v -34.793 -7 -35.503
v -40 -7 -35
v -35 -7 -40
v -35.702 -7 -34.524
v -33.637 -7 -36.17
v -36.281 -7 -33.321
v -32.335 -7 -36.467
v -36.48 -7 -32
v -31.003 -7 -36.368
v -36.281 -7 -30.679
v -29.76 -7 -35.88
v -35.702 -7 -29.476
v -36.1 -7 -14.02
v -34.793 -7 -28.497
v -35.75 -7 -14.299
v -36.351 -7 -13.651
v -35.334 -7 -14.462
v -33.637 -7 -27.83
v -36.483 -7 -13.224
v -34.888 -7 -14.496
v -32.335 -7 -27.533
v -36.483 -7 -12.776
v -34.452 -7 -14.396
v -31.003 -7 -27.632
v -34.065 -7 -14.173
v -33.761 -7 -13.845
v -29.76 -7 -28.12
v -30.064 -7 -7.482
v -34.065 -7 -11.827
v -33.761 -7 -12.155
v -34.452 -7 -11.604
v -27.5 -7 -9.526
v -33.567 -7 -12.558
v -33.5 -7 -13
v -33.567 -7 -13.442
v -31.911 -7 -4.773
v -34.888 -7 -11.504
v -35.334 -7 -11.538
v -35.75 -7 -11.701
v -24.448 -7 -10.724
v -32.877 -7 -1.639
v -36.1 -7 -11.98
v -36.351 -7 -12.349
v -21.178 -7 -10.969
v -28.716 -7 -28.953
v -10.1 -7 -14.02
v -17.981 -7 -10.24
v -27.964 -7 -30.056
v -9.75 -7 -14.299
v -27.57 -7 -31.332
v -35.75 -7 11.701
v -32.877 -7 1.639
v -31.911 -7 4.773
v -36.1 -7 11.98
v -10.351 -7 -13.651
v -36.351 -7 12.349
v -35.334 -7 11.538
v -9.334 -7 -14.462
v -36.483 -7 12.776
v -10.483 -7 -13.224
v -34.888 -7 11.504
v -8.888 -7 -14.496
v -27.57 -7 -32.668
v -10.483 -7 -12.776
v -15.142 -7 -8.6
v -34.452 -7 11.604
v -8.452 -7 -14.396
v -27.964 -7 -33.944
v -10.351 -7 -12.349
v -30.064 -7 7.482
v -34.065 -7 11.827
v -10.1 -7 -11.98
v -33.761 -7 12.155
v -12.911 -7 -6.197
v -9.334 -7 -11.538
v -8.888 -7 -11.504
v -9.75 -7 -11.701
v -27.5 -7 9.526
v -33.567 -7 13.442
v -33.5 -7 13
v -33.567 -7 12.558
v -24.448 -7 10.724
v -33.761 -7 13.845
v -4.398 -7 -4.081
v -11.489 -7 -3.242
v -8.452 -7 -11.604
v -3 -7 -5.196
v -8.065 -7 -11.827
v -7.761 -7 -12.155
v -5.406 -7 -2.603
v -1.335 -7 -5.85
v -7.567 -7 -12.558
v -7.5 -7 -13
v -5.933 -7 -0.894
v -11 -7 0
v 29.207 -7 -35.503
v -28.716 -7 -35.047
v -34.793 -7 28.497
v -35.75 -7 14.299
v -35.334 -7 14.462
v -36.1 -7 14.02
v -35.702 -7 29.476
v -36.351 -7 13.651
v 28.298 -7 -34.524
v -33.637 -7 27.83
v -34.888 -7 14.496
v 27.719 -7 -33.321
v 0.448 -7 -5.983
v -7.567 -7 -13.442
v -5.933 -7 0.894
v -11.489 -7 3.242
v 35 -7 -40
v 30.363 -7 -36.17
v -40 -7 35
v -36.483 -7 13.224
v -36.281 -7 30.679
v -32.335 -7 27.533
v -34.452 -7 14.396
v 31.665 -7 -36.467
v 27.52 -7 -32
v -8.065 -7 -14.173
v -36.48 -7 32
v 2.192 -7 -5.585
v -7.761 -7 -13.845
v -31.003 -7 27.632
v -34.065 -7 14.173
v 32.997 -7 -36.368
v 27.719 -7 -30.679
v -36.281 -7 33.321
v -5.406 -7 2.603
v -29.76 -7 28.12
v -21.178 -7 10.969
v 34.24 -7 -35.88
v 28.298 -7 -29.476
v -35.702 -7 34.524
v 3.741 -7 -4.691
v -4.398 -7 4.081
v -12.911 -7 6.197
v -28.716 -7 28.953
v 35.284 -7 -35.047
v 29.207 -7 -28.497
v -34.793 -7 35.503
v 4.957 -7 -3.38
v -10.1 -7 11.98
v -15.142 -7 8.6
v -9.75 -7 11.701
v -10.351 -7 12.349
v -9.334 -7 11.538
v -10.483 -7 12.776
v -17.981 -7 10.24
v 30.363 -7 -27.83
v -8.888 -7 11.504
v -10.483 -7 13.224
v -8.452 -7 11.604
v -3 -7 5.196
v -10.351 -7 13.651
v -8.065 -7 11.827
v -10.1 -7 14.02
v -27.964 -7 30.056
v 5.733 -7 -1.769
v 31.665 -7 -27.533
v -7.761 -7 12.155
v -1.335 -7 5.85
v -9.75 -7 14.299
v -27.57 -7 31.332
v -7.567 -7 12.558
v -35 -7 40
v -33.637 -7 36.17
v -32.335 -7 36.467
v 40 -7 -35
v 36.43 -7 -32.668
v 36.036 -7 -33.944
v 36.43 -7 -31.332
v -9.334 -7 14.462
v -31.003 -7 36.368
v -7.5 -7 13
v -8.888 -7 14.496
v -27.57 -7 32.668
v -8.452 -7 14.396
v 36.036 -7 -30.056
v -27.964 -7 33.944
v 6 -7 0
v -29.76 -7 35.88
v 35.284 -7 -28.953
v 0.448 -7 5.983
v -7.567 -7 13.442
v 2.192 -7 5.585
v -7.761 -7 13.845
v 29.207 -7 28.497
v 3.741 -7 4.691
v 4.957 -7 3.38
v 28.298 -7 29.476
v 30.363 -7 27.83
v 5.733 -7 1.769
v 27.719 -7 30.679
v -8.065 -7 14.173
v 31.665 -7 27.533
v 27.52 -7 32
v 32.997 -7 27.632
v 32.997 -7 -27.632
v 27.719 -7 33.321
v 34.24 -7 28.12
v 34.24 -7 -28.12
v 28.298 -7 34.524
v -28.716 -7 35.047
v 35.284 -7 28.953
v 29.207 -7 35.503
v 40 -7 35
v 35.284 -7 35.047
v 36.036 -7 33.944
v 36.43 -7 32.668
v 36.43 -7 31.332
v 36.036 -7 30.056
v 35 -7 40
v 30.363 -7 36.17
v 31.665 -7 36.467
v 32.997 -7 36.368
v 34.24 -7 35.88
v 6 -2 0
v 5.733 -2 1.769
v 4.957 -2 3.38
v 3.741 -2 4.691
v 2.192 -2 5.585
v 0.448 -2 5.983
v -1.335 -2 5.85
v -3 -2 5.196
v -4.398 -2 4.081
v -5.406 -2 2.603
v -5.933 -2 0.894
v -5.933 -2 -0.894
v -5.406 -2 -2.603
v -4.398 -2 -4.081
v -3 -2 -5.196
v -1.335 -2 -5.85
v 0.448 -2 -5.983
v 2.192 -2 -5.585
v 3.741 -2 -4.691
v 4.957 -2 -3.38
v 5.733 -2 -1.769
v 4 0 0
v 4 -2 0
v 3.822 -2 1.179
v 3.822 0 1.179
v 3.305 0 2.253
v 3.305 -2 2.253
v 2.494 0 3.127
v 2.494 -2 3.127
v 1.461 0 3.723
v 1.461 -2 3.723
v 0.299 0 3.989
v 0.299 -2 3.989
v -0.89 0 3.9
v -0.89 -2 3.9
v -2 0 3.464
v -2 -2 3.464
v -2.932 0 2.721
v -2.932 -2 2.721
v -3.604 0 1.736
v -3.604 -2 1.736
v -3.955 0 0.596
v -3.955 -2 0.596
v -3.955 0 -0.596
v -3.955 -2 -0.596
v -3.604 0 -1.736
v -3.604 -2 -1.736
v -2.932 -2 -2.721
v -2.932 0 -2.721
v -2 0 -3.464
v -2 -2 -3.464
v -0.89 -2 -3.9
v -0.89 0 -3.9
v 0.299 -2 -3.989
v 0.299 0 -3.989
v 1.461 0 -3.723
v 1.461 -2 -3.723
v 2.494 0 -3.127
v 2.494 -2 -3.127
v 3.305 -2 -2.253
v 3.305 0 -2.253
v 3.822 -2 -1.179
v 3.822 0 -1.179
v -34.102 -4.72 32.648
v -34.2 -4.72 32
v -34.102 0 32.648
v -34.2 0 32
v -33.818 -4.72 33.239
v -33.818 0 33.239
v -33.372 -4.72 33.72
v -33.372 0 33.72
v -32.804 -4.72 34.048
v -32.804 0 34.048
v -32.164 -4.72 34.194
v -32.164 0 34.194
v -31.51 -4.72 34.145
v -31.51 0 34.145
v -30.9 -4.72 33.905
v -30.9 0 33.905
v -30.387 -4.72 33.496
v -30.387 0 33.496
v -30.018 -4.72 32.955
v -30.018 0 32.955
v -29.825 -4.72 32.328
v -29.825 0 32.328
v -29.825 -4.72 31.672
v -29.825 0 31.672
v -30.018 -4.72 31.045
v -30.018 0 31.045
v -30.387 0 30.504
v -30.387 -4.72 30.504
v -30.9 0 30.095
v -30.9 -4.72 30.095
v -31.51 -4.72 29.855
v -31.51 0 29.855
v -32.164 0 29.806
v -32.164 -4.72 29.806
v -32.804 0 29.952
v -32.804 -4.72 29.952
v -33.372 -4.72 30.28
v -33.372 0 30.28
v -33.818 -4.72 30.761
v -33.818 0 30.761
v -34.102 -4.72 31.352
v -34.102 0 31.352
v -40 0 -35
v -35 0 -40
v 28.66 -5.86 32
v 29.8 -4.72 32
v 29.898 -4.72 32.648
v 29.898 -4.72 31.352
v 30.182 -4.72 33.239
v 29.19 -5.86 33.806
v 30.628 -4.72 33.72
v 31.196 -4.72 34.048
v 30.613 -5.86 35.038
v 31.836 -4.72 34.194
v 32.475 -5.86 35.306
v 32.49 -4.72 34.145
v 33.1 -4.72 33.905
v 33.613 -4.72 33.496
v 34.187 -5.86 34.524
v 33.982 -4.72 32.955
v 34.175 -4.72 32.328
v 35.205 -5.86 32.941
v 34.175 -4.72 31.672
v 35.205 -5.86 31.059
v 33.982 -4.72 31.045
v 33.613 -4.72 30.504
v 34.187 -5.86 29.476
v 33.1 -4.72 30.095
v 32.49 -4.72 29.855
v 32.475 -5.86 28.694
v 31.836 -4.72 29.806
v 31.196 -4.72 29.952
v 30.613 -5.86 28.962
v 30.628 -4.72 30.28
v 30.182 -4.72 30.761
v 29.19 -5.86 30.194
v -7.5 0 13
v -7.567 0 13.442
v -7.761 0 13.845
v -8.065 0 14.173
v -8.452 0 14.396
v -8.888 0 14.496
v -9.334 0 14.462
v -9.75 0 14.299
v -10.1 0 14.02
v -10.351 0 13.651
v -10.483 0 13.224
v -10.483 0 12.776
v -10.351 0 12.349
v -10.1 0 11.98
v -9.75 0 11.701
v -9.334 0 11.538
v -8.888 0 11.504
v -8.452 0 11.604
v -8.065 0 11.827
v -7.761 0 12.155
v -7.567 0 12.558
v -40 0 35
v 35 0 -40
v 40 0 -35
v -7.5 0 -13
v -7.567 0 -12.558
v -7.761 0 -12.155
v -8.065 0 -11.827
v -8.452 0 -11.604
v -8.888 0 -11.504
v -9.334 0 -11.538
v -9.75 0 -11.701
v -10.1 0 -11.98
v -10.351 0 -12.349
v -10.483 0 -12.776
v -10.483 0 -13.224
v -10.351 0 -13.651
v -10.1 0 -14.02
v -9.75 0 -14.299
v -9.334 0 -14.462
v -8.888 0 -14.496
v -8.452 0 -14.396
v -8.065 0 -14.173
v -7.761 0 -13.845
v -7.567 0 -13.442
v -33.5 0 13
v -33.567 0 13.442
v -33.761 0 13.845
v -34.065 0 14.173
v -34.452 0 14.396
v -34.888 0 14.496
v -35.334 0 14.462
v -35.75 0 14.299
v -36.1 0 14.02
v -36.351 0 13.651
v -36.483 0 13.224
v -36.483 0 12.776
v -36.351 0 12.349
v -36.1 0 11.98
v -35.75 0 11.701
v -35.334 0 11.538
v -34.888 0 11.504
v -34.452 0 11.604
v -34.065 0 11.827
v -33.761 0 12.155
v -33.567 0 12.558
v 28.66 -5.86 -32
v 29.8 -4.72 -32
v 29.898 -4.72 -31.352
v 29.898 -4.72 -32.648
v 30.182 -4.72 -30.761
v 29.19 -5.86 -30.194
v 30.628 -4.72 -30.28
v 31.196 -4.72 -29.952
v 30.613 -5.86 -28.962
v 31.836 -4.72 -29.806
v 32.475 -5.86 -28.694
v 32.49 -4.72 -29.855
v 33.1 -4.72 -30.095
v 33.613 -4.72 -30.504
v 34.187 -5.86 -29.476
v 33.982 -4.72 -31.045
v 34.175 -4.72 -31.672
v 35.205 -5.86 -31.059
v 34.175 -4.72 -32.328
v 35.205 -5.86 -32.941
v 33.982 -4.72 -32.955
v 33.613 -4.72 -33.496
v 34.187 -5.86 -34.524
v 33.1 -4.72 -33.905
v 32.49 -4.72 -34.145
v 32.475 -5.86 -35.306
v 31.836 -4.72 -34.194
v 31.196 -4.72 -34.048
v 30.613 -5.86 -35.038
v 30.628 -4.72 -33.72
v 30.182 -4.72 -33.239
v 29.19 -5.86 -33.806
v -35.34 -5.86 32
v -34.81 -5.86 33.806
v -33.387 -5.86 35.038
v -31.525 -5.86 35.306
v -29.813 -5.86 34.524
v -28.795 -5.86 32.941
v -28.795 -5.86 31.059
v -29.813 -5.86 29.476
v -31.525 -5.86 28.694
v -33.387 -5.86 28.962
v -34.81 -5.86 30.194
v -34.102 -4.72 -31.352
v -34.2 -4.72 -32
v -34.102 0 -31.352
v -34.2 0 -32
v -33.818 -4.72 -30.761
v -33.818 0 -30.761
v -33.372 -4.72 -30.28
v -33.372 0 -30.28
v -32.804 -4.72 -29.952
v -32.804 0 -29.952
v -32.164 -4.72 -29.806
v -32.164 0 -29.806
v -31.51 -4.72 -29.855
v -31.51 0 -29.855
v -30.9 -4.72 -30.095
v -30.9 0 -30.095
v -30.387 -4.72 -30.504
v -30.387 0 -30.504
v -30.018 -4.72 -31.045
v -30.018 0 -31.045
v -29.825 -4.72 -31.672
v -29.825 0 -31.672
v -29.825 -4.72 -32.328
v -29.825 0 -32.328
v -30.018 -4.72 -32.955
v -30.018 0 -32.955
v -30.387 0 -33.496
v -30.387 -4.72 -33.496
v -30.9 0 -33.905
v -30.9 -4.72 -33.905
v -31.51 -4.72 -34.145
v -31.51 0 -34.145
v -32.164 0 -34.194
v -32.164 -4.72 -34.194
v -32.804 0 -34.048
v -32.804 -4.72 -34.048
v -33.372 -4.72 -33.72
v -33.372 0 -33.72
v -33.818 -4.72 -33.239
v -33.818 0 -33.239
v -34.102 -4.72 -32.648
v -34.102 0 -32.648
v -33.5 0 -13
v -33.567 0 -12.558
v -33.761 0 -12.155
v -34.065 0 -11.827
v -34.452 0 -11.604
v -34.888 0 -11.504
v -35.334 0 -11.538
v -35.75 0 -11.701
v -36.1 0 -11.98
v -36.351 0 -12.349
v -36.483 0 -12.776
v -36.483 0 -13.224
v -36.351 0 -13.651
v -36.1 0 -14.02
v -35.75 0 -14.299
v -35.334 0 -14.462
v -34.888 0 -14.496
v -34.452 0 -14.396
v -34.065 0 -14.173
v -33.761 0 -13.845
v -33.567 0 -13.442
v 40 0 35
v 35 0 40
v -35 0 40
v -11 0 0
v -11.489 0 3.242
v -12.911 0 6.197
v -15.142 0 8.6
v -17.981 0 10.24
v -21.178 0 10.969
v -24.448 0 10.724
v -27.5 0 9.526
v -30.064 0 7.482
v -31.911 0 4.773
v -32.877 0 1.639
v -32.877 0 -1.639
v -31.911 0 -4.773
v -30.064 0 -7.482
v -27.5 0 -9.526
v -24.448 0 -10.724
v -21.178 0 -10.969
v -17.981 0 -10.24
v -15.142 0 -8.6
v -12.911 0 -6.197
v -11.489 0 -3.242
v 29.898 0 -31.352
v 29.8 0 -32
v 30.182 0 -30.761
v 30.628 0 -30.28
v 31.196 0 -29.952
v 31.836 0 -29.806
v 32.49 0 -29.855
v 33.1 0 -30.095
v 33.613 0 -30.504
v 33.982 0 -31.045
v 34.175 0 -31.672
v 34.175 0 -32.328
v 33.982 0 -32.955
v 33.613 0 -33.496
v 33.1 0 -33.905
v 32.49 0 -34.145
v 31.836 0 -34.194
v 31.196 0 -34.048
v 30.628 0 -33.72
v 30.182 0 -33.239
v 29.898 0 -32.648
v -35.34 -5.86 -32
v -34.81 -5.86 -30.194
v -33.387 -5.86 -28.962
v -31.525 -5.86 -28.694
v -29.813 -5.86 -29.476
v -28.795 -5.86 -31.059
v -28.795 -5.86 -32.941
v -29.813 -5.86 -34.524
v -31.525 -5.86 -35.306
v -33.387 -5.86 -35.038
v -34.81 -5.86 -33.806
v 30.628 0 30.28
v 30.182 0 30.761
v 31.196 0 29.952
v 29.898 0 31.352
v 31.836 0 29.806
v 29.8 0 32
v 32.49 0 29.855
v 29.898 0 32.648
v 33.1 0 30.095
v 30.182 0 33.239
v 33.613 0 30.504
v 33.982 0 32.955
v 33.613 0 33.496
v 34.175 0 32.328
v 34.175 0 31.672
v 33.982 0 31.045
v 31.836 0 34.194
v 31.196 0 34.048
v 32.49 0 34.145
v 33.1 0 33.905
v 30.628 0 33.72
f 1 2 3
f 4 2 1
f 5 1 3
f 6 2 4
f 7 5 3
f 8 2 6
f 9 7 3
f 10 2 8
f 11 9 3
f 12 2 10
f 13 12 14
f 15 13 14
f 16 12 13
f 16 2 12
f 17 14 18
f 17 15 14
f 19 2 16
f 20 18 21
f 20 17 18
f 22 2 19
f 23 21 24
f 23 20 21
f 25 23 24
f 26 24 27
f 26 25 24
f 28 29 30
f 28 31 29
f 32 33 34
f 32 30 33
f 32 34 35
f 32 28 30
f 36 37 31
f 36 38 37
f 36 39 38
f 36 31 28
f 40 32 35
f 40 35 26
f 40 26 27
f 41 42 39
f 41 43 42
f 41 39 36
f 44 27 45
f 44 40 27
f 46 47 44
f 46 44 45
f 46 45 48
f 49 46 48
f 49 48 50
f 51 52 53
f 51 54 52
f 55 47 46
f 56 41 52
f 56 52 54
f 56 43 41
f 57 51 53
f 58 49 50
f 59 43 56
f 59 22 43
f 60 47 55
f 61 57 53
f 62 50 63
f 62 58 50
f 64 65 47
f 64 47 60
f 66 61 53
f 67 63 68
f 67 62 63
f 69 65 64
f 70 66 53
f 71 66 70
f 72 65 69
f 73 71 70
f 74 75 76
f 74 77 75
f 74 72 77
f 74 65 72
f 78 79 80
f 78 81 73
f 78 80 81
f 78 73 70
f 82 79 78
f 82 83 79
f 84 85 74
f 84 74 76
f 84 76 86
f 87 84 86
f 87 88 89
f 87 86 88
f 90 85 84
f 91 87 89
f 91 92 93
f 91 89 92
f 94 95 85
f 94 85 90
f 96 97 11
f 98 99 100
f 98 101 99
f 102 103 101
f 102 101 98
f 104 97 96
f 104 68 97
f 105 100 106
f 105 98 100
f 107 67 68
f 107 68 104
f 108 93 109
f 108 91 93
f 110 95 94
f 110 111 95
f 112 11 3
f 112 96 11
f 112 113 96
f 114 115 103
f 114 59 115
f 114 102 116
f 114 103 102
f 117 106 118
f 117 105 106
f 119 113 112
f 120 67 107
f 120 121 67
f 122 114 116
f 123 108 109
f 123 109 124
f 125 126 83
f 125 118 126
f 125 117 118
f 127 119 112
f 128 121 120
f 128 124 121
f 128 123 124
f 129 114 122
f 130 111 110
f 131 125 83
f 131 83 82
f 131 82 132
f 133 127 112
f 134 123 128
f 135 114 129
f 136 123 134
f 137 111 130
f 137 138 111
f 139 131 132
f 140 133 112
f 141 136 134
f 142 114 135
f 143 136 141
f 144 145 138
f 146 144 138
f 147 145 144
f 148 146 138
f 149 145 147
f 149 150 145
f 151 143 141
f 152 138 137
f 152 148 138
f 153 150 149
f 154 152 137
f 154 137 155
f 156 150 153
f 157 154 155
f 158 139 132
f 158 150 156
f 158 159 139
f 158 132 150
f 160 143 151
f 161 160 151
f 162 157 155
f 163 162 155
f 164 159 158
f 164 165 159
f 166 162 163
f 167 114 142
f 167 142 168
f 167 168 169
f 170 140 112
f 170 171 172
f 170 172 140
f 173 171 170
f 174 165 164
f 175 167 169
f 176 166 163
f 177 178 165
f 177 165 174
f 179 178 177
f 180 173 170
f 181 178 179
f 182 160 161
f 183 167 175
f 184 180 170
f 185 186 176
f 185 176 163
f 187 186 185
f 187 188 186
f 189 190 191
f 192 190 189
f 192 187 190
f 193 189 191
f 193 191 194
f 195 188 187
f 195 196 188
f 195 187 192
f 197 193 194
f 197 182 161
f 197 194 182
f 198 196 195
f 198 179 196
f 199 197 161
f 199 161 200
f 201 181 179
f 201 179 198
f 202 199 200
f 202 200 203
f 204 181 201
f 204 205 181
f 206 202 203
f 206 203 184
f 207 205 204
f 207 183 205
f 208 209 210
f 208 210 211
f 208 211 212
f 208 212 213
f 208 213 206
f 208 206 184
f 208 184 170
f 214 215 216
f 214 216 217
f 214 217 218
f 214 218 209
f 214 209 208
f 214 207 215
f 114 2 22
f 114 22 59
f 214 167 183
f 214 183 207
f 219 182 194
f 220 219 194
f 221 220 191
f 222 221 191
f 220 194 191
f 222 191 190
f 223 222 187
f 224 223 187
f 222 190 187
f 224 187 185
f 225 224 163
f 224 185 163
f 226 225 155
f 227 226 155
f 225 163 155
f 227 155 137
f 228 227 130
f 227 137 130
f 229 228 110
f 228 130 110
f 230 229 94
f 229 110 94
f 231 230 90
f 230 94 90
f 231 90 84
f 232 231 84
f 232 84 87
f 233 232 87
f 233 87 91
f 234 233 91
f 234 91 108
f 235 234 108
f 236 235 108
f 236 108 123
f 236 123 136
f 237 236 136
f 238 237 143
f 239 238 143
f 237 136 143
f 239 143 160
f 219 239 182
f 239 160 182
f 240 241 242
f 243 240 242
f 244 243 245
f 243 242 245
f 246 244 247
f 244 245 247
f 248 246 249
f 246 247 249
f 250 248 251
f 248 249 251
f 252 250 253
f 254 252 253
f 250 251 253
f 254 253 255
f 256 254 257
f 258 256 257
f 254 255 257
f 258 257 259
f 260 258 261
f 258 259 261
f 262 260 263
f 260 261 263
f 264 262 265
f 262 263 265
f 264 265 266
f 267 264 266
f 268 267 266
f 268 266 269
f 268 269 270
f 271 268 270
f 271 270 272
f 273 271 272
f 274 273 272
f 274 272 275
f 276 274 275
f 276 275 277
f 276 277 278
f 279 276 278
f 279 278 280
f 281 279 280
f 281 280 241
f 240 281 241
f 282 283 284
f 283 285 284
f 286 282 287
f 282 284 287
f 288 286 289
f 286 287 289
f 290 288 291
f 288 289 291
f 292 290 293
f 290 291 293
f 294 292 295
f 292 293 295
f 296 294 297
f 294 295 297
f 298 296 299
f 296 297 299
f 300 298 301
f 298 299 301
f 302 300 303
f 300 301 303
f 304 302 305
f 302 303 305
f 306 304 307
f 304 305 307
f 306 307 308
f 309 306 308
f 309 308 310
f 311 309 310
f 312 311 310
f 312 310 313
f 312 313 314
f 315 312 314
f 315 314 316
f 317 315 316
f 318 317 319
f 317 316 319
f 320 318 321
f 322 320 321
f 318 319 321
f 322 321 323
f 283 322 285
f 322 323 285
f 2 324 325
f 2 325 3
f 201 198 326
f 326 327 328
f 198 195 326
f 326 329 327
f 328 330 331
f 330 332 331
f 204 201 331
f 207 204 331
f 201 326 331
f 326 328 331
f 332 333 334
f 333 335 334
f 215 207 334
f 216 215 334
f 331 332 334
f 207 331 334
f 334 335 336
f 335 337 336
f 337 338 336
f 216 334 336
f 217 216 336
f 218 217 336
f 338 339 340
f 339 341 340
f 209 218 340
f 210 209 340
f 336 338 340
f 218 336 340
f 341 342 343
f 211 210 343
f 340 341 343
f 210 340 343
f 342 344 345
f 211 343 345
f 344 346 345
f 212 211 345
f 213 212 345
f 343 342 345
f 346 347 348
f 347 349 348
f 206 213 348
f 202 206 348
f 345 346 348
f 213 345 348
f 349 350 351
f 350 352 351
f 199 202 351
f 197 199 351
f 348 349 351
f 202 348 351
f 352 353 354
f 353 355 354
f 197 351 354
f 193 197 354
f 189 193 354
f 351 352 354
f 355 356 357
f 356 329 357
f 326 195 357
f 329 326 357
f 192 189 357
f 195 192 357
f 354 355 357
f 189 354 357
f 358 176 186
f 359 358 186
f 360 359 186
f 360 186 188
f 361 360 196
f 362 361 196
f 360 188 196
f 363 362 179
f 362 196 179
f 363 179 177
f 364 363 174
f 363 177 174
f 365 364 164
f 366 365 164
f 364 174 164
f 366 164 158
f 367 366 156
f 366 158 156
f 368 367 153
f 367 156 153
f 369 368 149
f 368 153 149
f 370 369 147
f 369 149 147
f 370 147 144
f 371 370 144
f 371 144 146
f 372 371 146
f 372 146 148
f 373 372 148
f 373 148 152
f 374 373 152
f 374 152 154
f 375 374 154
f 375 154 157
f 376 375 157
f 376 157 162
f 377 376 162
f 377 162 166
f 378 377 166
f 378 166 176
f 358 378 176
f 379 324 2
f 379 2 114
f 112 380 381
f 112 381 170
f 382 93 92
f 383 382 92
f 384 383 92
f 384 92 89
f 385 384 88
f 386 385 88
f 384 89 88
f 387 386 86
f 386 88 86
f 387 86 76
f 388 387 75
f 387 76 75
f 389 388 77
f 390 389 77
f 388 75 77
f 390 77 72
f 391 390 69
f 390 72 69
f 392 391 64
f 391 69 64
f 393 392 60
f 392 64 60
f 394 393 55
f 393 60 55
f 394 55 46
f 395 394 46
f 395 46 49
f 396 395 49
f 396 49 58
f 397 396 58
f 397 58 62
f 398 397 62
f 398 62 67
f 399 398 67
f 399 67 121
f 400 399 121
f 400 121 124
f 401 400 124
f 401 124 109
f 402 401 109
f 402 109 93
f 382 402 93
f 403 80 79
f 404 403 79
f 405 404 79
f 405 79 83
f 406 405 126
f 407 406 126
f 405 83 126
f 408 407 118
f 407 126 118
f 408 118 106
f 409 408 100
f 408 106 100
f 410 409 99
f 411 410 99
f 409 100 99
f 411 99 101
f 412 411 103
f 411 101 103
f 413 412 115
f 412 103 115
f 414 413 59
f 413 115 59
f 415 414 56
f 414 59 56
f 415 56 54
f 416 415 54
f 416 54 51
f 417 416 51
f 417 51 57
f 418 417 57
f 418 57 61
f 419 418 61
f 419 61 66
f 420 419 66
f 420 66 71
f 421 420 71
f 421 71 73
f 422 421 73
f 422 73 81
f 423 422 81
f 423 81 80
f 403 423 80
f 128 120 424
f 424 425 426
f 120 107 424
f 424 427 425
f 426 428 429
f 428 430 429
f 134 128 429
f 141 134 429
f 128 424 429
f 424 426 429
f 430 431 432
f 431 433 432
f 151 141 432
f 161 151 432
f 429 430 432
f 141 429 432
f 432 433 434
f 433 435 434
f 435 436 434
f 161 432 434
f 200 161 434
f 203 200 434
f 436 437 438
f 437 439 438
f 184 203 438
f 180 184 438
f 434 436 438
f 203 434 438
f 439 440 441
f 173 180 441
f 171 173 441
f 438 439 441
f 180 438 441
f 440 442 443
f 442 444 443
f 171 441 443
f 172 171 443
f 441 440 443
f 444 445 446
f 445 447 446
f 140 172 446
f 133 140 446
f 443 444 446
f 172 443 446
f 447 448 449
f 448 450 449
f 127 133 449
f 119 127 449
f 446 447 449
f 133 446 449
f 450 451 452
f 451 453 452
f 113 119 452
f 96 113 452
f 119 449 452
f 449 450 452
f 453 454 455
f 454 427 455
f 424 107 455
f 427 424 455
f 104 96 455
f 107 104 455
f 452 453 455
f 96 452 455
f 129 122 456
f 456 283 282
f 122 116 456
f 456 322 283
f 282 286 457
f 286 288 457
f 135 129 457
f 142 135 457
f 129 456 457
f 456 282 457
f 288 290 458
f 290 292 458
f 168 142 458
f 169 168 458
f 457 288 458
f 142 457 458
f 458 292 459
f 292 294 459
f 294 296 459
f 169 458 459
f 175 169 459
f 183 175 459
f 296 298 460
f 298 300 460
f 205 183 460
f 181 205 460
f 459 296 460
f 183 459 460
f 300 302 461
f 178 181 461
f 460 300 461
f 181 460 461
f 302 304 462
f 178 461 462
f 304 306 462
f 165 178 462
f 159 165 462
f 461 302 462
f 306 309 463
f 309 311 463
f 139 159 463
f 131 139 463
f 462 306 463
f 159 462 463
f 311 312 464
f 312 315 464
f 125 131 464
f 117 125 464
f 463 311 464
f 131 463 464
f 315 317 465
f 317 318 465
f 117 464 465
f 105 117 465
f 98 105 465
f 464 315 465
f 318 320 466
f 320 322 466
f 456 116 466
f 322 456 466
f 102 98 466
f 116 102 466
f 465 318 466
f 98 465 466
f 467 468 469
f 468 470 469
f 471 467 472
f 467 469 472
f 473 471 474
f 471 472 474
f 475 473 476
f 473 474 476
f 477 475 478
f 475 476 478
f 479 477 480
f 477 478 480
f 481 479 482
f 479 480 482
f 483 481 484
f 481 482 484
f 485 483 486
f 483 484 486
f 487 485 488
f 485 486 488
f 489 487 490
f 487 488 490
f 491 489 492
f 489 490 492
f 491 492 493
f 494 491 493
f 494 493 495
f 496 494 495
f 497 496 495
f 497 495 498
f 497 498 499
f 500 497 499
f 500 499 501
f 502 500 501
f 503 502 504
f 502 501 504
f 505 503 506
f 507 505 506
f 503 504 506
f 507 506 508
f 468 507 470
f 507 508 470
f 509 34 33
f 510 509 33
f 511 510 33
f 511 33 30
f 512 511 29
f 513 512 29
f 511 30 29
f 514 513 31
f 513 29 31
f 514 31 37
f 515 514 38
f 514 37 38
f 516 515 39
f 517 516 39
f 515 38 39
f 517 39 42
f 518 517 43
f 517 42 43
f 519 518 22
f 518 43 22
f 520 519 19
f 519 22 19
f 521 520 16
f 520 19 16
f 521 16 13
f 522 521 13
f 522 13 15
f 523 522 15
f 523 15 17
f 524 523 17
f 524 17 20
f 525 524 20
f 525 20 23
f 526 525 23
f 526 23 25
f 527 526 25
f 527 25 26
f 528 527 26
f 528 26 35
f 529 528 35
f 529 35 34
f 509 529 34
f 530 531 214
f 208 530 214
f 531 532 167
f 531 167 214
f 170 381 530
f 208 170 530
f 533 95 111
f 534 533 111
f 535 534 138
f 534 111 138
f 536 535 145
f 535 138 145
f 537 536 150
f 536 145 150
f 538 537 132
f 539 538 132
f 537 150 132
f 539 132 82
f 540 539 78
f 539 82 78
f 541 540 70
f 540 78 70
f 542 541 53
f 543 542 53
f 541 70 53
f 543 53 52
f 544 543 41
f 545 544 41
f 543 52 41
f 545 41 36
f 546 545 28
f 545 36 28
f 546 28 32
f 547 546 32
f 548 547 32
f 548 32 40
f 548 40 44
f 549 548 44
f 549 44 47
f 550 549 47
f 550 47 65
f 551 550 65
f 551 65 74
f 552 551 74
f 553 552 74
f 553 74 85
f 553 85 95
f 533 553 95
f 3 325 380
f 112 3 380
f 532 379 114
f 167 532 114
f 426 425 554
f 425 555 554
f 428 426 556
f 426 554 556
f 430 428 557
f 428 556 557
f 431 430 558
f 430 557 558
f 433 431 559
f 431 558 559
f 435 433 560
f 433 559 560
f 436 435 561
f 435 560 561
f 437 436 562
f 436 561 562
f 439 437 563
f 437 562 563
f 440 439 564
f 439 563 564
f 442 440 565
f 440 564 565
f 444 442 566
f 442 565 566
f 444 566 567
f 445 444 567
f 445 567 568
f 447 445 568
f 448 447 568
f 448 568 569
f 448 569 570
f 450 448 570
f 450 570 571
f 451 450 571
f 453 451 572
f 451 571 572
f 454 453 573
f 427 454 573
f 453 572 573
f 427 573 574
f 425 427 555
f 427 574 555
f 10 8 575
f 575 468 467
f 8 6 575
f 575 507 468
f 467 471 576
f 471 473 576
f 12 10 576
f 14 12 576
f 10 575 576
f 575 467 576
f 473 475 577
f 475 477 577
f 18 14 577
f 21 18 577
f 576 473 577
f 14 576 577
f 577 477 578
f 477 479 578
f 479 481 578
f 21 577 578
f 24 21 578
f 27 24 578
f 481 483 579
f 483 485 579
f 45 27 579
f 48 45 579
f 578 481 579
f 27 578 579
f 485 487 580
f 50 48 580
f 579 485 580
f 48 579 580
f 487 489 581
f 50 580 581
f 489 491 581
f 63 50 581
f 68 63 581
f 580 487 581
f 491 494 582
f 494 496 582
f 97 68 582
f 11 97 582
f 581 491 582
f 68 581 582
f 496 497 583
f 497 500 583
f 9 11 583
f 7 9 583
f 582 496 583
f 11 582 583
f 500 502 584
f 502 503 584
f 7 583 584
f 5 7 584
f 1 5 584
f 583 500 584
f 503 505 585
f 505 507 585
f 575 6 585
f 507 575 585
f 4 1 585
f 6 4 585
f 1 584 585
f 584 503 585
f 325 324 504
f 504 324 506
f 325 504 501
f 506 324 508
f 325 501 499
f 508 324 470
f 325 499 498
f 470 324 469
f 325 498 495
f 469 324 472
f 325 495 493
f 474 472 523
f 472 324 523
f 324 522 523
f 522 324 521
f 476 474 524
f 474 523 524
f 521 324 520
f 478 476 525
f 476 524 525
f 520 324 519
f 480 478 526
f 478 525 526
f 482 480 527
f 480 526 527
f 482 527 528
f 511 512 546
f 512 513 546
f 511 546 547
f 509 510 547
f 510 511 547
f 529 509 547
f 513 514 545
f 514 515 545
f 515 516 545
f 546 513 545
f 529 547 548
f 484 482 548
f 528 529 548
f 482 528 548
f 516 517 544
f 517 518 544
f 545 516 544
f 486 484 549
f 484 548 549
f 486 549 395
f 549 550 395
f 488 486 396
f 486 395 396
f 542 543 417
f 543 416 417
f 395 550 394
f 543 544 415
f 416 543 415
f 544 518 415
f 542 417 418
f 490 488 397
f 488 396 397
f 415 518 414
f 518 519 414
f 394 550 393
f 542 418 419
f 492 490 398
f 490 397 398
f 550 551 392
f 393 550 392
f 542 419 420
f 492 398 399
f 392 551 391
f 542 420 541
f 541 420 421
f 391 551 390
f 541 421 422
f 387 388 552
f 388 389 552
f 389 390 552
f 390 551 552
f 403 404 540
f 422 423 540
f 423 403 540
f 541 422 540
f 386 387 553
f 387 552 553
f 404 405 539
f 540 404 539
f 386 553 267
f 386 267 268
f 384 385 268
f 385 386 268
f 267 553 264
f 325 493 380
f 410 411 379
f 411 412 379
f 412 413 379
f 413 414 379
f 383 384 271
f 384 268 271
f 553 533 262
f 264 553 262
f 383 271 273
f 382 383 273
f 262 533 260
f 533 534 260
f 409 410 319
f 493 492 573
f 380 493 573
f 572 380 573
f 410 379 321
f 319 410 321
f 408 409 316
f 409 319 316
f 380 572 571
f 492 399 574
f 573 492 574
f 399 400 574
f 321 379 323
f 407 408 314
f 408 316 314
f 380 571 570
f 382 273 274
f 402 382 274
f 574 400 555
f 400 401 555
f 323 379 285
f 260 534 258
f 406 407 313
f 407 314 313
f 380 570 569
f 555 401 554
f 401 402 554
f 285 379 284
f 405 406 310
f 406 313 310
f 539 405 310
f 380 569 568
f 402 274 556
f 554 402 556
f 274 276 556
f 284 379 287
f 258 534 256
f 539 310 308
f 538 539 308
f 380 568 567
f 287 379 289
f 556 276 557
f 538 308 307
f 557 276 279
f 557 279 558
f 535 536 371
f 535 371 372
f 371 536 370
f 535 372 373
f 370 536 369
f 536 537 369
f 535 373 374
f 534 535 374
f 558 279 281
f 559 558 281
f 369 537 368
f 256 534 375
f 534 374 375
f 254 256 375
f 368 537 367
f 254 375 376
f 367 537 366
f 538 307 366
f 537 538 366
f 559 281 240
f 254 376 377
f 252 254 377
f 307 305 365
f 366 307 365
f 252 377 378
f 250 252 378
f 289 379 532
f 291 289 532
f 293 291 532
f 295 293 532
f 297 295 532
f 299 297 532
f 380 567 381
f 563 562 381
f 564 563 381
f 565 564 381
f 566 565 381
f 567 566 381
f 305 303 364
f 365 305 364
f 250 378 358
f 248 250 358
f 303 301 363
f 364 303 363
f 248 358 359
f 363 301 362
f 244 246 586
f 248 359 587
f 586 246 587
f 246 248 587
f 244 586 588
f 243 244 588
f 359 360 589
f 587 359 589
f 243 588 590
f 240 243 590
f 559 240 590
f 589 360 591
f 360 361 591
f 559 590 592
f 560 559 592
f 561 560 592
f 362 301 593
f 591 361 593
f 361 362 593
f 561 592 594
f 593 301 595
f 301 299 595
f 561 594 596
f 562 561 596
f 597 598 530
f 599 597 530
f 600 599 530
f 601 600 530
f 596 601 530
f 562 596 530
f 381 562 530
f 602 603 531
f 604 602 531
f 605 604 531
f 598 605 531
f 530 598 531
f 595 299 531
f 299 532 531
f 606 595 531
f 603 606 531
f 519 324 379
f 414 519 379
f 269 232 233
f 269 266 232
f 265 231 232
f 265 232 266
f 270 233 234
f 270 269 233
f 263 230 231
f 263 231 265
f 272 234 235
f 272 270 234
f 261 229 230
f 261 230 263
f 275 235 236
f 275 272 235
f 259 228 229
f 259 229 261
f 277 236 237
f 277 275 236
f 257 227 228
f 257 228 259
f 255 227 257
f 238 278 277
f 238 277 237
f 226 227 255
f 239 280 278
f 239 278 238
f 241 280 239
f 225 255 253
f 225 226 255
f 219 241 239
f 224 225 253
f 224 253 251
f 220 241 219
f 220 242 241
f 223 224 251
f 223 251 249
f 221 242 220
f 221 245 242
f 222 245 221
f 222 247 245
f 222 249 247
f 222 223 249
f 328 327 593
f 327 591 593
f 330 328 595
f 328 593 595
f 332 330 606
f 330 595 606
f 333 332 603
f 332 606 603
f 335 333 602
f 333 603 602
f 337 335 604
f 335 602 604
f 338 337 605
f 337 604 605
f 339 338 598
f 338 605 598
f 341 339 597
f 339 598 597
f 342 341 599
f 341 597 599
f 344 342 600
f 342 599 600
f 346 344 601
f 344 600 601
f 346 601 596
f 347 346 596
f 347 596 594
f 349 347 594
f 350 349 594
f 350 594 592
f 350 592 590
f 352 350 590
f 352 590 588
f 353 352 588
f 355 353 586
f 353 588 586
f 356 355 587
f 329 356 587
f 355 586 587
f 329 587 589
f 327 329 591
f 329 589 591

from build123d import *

# Parameters (mm, degrees)
F0_W            = 80
F0_H            = 80
F1_DEPTH        = 7
F2_R            = 6
F3_DEPTH        = 5
F4_R            = 4
F5_DEPTH        = 2.001
F6_R            = 11
F6_R_2          = 1.5
F7_DEPTH        = 7.001
F8_SIZE         = 5
F10_D           = 4.4
F10_CSINK_D     = 8.96
F10_CSINK_ANGLE = 90


with BuildPart() as f1:
    # F0 (on Front) → F1 (new body)
    with BuildSketch(Plane.XZ):
        Rectangle(F0_W, F0_H)
    extrude(amount=F1_DEPTH)

    # F2 (on face) → F3 (cut)
    with BuildSketch(Plane.XZ.offset(7)):
        Circle(F2_R)
    extrude(amount=-F3_DEPTH, mode=Mode.SUBTRACT)

    # F4 (on face) → F5 (cut, through all)
    with BuildSketch(Plane.XZ.offset(2)):
        Circle(F4_R)
    extrude(amount=-F5_DEPTH, mode=Mode.SUBTRACT)

    # F6 (on face) → F7 (cut, through all)
    with BuildSketch(Plane.XZ.offset(7)):
        with Locations((-22, 0)):
            Circle(F6_R)
        with Locations((-35, 13)):
            Circle(F6_R_2)
        with Locations((-35, -13)):
            Circle(F6_R_2)
        with Locations((-9, -13)):
            Circle(F6_R_2)
        with Locations((-9, 13)):
            Circle(F6_R_2)
    extrude(amount=-F7_DEPTH, mode=Mode.SUBTRACT)

    # F8
    f8_edges = [f1.edges().sort_by_distance(p)[0] for p in [
        (-40, -3.5, 40),
        (40, -3.5, 40),
        (-40, -3.5, -40),
        (40, -3.5, -40),
    ]]
    chamfer(f8_edges, length=F8_SIZE)

    # F10 (through all)
    with Locations(Plane.XZ.offset(7)):
        with Locations((-32, 32), (32, 32), (32, -32), (-32, -32)):
            CounterSinkHole(F10_D / 2, F10_CSINK_D / 2, counter_sink_angle=F10_CSINK_ANGLE)


solid = f1.part
